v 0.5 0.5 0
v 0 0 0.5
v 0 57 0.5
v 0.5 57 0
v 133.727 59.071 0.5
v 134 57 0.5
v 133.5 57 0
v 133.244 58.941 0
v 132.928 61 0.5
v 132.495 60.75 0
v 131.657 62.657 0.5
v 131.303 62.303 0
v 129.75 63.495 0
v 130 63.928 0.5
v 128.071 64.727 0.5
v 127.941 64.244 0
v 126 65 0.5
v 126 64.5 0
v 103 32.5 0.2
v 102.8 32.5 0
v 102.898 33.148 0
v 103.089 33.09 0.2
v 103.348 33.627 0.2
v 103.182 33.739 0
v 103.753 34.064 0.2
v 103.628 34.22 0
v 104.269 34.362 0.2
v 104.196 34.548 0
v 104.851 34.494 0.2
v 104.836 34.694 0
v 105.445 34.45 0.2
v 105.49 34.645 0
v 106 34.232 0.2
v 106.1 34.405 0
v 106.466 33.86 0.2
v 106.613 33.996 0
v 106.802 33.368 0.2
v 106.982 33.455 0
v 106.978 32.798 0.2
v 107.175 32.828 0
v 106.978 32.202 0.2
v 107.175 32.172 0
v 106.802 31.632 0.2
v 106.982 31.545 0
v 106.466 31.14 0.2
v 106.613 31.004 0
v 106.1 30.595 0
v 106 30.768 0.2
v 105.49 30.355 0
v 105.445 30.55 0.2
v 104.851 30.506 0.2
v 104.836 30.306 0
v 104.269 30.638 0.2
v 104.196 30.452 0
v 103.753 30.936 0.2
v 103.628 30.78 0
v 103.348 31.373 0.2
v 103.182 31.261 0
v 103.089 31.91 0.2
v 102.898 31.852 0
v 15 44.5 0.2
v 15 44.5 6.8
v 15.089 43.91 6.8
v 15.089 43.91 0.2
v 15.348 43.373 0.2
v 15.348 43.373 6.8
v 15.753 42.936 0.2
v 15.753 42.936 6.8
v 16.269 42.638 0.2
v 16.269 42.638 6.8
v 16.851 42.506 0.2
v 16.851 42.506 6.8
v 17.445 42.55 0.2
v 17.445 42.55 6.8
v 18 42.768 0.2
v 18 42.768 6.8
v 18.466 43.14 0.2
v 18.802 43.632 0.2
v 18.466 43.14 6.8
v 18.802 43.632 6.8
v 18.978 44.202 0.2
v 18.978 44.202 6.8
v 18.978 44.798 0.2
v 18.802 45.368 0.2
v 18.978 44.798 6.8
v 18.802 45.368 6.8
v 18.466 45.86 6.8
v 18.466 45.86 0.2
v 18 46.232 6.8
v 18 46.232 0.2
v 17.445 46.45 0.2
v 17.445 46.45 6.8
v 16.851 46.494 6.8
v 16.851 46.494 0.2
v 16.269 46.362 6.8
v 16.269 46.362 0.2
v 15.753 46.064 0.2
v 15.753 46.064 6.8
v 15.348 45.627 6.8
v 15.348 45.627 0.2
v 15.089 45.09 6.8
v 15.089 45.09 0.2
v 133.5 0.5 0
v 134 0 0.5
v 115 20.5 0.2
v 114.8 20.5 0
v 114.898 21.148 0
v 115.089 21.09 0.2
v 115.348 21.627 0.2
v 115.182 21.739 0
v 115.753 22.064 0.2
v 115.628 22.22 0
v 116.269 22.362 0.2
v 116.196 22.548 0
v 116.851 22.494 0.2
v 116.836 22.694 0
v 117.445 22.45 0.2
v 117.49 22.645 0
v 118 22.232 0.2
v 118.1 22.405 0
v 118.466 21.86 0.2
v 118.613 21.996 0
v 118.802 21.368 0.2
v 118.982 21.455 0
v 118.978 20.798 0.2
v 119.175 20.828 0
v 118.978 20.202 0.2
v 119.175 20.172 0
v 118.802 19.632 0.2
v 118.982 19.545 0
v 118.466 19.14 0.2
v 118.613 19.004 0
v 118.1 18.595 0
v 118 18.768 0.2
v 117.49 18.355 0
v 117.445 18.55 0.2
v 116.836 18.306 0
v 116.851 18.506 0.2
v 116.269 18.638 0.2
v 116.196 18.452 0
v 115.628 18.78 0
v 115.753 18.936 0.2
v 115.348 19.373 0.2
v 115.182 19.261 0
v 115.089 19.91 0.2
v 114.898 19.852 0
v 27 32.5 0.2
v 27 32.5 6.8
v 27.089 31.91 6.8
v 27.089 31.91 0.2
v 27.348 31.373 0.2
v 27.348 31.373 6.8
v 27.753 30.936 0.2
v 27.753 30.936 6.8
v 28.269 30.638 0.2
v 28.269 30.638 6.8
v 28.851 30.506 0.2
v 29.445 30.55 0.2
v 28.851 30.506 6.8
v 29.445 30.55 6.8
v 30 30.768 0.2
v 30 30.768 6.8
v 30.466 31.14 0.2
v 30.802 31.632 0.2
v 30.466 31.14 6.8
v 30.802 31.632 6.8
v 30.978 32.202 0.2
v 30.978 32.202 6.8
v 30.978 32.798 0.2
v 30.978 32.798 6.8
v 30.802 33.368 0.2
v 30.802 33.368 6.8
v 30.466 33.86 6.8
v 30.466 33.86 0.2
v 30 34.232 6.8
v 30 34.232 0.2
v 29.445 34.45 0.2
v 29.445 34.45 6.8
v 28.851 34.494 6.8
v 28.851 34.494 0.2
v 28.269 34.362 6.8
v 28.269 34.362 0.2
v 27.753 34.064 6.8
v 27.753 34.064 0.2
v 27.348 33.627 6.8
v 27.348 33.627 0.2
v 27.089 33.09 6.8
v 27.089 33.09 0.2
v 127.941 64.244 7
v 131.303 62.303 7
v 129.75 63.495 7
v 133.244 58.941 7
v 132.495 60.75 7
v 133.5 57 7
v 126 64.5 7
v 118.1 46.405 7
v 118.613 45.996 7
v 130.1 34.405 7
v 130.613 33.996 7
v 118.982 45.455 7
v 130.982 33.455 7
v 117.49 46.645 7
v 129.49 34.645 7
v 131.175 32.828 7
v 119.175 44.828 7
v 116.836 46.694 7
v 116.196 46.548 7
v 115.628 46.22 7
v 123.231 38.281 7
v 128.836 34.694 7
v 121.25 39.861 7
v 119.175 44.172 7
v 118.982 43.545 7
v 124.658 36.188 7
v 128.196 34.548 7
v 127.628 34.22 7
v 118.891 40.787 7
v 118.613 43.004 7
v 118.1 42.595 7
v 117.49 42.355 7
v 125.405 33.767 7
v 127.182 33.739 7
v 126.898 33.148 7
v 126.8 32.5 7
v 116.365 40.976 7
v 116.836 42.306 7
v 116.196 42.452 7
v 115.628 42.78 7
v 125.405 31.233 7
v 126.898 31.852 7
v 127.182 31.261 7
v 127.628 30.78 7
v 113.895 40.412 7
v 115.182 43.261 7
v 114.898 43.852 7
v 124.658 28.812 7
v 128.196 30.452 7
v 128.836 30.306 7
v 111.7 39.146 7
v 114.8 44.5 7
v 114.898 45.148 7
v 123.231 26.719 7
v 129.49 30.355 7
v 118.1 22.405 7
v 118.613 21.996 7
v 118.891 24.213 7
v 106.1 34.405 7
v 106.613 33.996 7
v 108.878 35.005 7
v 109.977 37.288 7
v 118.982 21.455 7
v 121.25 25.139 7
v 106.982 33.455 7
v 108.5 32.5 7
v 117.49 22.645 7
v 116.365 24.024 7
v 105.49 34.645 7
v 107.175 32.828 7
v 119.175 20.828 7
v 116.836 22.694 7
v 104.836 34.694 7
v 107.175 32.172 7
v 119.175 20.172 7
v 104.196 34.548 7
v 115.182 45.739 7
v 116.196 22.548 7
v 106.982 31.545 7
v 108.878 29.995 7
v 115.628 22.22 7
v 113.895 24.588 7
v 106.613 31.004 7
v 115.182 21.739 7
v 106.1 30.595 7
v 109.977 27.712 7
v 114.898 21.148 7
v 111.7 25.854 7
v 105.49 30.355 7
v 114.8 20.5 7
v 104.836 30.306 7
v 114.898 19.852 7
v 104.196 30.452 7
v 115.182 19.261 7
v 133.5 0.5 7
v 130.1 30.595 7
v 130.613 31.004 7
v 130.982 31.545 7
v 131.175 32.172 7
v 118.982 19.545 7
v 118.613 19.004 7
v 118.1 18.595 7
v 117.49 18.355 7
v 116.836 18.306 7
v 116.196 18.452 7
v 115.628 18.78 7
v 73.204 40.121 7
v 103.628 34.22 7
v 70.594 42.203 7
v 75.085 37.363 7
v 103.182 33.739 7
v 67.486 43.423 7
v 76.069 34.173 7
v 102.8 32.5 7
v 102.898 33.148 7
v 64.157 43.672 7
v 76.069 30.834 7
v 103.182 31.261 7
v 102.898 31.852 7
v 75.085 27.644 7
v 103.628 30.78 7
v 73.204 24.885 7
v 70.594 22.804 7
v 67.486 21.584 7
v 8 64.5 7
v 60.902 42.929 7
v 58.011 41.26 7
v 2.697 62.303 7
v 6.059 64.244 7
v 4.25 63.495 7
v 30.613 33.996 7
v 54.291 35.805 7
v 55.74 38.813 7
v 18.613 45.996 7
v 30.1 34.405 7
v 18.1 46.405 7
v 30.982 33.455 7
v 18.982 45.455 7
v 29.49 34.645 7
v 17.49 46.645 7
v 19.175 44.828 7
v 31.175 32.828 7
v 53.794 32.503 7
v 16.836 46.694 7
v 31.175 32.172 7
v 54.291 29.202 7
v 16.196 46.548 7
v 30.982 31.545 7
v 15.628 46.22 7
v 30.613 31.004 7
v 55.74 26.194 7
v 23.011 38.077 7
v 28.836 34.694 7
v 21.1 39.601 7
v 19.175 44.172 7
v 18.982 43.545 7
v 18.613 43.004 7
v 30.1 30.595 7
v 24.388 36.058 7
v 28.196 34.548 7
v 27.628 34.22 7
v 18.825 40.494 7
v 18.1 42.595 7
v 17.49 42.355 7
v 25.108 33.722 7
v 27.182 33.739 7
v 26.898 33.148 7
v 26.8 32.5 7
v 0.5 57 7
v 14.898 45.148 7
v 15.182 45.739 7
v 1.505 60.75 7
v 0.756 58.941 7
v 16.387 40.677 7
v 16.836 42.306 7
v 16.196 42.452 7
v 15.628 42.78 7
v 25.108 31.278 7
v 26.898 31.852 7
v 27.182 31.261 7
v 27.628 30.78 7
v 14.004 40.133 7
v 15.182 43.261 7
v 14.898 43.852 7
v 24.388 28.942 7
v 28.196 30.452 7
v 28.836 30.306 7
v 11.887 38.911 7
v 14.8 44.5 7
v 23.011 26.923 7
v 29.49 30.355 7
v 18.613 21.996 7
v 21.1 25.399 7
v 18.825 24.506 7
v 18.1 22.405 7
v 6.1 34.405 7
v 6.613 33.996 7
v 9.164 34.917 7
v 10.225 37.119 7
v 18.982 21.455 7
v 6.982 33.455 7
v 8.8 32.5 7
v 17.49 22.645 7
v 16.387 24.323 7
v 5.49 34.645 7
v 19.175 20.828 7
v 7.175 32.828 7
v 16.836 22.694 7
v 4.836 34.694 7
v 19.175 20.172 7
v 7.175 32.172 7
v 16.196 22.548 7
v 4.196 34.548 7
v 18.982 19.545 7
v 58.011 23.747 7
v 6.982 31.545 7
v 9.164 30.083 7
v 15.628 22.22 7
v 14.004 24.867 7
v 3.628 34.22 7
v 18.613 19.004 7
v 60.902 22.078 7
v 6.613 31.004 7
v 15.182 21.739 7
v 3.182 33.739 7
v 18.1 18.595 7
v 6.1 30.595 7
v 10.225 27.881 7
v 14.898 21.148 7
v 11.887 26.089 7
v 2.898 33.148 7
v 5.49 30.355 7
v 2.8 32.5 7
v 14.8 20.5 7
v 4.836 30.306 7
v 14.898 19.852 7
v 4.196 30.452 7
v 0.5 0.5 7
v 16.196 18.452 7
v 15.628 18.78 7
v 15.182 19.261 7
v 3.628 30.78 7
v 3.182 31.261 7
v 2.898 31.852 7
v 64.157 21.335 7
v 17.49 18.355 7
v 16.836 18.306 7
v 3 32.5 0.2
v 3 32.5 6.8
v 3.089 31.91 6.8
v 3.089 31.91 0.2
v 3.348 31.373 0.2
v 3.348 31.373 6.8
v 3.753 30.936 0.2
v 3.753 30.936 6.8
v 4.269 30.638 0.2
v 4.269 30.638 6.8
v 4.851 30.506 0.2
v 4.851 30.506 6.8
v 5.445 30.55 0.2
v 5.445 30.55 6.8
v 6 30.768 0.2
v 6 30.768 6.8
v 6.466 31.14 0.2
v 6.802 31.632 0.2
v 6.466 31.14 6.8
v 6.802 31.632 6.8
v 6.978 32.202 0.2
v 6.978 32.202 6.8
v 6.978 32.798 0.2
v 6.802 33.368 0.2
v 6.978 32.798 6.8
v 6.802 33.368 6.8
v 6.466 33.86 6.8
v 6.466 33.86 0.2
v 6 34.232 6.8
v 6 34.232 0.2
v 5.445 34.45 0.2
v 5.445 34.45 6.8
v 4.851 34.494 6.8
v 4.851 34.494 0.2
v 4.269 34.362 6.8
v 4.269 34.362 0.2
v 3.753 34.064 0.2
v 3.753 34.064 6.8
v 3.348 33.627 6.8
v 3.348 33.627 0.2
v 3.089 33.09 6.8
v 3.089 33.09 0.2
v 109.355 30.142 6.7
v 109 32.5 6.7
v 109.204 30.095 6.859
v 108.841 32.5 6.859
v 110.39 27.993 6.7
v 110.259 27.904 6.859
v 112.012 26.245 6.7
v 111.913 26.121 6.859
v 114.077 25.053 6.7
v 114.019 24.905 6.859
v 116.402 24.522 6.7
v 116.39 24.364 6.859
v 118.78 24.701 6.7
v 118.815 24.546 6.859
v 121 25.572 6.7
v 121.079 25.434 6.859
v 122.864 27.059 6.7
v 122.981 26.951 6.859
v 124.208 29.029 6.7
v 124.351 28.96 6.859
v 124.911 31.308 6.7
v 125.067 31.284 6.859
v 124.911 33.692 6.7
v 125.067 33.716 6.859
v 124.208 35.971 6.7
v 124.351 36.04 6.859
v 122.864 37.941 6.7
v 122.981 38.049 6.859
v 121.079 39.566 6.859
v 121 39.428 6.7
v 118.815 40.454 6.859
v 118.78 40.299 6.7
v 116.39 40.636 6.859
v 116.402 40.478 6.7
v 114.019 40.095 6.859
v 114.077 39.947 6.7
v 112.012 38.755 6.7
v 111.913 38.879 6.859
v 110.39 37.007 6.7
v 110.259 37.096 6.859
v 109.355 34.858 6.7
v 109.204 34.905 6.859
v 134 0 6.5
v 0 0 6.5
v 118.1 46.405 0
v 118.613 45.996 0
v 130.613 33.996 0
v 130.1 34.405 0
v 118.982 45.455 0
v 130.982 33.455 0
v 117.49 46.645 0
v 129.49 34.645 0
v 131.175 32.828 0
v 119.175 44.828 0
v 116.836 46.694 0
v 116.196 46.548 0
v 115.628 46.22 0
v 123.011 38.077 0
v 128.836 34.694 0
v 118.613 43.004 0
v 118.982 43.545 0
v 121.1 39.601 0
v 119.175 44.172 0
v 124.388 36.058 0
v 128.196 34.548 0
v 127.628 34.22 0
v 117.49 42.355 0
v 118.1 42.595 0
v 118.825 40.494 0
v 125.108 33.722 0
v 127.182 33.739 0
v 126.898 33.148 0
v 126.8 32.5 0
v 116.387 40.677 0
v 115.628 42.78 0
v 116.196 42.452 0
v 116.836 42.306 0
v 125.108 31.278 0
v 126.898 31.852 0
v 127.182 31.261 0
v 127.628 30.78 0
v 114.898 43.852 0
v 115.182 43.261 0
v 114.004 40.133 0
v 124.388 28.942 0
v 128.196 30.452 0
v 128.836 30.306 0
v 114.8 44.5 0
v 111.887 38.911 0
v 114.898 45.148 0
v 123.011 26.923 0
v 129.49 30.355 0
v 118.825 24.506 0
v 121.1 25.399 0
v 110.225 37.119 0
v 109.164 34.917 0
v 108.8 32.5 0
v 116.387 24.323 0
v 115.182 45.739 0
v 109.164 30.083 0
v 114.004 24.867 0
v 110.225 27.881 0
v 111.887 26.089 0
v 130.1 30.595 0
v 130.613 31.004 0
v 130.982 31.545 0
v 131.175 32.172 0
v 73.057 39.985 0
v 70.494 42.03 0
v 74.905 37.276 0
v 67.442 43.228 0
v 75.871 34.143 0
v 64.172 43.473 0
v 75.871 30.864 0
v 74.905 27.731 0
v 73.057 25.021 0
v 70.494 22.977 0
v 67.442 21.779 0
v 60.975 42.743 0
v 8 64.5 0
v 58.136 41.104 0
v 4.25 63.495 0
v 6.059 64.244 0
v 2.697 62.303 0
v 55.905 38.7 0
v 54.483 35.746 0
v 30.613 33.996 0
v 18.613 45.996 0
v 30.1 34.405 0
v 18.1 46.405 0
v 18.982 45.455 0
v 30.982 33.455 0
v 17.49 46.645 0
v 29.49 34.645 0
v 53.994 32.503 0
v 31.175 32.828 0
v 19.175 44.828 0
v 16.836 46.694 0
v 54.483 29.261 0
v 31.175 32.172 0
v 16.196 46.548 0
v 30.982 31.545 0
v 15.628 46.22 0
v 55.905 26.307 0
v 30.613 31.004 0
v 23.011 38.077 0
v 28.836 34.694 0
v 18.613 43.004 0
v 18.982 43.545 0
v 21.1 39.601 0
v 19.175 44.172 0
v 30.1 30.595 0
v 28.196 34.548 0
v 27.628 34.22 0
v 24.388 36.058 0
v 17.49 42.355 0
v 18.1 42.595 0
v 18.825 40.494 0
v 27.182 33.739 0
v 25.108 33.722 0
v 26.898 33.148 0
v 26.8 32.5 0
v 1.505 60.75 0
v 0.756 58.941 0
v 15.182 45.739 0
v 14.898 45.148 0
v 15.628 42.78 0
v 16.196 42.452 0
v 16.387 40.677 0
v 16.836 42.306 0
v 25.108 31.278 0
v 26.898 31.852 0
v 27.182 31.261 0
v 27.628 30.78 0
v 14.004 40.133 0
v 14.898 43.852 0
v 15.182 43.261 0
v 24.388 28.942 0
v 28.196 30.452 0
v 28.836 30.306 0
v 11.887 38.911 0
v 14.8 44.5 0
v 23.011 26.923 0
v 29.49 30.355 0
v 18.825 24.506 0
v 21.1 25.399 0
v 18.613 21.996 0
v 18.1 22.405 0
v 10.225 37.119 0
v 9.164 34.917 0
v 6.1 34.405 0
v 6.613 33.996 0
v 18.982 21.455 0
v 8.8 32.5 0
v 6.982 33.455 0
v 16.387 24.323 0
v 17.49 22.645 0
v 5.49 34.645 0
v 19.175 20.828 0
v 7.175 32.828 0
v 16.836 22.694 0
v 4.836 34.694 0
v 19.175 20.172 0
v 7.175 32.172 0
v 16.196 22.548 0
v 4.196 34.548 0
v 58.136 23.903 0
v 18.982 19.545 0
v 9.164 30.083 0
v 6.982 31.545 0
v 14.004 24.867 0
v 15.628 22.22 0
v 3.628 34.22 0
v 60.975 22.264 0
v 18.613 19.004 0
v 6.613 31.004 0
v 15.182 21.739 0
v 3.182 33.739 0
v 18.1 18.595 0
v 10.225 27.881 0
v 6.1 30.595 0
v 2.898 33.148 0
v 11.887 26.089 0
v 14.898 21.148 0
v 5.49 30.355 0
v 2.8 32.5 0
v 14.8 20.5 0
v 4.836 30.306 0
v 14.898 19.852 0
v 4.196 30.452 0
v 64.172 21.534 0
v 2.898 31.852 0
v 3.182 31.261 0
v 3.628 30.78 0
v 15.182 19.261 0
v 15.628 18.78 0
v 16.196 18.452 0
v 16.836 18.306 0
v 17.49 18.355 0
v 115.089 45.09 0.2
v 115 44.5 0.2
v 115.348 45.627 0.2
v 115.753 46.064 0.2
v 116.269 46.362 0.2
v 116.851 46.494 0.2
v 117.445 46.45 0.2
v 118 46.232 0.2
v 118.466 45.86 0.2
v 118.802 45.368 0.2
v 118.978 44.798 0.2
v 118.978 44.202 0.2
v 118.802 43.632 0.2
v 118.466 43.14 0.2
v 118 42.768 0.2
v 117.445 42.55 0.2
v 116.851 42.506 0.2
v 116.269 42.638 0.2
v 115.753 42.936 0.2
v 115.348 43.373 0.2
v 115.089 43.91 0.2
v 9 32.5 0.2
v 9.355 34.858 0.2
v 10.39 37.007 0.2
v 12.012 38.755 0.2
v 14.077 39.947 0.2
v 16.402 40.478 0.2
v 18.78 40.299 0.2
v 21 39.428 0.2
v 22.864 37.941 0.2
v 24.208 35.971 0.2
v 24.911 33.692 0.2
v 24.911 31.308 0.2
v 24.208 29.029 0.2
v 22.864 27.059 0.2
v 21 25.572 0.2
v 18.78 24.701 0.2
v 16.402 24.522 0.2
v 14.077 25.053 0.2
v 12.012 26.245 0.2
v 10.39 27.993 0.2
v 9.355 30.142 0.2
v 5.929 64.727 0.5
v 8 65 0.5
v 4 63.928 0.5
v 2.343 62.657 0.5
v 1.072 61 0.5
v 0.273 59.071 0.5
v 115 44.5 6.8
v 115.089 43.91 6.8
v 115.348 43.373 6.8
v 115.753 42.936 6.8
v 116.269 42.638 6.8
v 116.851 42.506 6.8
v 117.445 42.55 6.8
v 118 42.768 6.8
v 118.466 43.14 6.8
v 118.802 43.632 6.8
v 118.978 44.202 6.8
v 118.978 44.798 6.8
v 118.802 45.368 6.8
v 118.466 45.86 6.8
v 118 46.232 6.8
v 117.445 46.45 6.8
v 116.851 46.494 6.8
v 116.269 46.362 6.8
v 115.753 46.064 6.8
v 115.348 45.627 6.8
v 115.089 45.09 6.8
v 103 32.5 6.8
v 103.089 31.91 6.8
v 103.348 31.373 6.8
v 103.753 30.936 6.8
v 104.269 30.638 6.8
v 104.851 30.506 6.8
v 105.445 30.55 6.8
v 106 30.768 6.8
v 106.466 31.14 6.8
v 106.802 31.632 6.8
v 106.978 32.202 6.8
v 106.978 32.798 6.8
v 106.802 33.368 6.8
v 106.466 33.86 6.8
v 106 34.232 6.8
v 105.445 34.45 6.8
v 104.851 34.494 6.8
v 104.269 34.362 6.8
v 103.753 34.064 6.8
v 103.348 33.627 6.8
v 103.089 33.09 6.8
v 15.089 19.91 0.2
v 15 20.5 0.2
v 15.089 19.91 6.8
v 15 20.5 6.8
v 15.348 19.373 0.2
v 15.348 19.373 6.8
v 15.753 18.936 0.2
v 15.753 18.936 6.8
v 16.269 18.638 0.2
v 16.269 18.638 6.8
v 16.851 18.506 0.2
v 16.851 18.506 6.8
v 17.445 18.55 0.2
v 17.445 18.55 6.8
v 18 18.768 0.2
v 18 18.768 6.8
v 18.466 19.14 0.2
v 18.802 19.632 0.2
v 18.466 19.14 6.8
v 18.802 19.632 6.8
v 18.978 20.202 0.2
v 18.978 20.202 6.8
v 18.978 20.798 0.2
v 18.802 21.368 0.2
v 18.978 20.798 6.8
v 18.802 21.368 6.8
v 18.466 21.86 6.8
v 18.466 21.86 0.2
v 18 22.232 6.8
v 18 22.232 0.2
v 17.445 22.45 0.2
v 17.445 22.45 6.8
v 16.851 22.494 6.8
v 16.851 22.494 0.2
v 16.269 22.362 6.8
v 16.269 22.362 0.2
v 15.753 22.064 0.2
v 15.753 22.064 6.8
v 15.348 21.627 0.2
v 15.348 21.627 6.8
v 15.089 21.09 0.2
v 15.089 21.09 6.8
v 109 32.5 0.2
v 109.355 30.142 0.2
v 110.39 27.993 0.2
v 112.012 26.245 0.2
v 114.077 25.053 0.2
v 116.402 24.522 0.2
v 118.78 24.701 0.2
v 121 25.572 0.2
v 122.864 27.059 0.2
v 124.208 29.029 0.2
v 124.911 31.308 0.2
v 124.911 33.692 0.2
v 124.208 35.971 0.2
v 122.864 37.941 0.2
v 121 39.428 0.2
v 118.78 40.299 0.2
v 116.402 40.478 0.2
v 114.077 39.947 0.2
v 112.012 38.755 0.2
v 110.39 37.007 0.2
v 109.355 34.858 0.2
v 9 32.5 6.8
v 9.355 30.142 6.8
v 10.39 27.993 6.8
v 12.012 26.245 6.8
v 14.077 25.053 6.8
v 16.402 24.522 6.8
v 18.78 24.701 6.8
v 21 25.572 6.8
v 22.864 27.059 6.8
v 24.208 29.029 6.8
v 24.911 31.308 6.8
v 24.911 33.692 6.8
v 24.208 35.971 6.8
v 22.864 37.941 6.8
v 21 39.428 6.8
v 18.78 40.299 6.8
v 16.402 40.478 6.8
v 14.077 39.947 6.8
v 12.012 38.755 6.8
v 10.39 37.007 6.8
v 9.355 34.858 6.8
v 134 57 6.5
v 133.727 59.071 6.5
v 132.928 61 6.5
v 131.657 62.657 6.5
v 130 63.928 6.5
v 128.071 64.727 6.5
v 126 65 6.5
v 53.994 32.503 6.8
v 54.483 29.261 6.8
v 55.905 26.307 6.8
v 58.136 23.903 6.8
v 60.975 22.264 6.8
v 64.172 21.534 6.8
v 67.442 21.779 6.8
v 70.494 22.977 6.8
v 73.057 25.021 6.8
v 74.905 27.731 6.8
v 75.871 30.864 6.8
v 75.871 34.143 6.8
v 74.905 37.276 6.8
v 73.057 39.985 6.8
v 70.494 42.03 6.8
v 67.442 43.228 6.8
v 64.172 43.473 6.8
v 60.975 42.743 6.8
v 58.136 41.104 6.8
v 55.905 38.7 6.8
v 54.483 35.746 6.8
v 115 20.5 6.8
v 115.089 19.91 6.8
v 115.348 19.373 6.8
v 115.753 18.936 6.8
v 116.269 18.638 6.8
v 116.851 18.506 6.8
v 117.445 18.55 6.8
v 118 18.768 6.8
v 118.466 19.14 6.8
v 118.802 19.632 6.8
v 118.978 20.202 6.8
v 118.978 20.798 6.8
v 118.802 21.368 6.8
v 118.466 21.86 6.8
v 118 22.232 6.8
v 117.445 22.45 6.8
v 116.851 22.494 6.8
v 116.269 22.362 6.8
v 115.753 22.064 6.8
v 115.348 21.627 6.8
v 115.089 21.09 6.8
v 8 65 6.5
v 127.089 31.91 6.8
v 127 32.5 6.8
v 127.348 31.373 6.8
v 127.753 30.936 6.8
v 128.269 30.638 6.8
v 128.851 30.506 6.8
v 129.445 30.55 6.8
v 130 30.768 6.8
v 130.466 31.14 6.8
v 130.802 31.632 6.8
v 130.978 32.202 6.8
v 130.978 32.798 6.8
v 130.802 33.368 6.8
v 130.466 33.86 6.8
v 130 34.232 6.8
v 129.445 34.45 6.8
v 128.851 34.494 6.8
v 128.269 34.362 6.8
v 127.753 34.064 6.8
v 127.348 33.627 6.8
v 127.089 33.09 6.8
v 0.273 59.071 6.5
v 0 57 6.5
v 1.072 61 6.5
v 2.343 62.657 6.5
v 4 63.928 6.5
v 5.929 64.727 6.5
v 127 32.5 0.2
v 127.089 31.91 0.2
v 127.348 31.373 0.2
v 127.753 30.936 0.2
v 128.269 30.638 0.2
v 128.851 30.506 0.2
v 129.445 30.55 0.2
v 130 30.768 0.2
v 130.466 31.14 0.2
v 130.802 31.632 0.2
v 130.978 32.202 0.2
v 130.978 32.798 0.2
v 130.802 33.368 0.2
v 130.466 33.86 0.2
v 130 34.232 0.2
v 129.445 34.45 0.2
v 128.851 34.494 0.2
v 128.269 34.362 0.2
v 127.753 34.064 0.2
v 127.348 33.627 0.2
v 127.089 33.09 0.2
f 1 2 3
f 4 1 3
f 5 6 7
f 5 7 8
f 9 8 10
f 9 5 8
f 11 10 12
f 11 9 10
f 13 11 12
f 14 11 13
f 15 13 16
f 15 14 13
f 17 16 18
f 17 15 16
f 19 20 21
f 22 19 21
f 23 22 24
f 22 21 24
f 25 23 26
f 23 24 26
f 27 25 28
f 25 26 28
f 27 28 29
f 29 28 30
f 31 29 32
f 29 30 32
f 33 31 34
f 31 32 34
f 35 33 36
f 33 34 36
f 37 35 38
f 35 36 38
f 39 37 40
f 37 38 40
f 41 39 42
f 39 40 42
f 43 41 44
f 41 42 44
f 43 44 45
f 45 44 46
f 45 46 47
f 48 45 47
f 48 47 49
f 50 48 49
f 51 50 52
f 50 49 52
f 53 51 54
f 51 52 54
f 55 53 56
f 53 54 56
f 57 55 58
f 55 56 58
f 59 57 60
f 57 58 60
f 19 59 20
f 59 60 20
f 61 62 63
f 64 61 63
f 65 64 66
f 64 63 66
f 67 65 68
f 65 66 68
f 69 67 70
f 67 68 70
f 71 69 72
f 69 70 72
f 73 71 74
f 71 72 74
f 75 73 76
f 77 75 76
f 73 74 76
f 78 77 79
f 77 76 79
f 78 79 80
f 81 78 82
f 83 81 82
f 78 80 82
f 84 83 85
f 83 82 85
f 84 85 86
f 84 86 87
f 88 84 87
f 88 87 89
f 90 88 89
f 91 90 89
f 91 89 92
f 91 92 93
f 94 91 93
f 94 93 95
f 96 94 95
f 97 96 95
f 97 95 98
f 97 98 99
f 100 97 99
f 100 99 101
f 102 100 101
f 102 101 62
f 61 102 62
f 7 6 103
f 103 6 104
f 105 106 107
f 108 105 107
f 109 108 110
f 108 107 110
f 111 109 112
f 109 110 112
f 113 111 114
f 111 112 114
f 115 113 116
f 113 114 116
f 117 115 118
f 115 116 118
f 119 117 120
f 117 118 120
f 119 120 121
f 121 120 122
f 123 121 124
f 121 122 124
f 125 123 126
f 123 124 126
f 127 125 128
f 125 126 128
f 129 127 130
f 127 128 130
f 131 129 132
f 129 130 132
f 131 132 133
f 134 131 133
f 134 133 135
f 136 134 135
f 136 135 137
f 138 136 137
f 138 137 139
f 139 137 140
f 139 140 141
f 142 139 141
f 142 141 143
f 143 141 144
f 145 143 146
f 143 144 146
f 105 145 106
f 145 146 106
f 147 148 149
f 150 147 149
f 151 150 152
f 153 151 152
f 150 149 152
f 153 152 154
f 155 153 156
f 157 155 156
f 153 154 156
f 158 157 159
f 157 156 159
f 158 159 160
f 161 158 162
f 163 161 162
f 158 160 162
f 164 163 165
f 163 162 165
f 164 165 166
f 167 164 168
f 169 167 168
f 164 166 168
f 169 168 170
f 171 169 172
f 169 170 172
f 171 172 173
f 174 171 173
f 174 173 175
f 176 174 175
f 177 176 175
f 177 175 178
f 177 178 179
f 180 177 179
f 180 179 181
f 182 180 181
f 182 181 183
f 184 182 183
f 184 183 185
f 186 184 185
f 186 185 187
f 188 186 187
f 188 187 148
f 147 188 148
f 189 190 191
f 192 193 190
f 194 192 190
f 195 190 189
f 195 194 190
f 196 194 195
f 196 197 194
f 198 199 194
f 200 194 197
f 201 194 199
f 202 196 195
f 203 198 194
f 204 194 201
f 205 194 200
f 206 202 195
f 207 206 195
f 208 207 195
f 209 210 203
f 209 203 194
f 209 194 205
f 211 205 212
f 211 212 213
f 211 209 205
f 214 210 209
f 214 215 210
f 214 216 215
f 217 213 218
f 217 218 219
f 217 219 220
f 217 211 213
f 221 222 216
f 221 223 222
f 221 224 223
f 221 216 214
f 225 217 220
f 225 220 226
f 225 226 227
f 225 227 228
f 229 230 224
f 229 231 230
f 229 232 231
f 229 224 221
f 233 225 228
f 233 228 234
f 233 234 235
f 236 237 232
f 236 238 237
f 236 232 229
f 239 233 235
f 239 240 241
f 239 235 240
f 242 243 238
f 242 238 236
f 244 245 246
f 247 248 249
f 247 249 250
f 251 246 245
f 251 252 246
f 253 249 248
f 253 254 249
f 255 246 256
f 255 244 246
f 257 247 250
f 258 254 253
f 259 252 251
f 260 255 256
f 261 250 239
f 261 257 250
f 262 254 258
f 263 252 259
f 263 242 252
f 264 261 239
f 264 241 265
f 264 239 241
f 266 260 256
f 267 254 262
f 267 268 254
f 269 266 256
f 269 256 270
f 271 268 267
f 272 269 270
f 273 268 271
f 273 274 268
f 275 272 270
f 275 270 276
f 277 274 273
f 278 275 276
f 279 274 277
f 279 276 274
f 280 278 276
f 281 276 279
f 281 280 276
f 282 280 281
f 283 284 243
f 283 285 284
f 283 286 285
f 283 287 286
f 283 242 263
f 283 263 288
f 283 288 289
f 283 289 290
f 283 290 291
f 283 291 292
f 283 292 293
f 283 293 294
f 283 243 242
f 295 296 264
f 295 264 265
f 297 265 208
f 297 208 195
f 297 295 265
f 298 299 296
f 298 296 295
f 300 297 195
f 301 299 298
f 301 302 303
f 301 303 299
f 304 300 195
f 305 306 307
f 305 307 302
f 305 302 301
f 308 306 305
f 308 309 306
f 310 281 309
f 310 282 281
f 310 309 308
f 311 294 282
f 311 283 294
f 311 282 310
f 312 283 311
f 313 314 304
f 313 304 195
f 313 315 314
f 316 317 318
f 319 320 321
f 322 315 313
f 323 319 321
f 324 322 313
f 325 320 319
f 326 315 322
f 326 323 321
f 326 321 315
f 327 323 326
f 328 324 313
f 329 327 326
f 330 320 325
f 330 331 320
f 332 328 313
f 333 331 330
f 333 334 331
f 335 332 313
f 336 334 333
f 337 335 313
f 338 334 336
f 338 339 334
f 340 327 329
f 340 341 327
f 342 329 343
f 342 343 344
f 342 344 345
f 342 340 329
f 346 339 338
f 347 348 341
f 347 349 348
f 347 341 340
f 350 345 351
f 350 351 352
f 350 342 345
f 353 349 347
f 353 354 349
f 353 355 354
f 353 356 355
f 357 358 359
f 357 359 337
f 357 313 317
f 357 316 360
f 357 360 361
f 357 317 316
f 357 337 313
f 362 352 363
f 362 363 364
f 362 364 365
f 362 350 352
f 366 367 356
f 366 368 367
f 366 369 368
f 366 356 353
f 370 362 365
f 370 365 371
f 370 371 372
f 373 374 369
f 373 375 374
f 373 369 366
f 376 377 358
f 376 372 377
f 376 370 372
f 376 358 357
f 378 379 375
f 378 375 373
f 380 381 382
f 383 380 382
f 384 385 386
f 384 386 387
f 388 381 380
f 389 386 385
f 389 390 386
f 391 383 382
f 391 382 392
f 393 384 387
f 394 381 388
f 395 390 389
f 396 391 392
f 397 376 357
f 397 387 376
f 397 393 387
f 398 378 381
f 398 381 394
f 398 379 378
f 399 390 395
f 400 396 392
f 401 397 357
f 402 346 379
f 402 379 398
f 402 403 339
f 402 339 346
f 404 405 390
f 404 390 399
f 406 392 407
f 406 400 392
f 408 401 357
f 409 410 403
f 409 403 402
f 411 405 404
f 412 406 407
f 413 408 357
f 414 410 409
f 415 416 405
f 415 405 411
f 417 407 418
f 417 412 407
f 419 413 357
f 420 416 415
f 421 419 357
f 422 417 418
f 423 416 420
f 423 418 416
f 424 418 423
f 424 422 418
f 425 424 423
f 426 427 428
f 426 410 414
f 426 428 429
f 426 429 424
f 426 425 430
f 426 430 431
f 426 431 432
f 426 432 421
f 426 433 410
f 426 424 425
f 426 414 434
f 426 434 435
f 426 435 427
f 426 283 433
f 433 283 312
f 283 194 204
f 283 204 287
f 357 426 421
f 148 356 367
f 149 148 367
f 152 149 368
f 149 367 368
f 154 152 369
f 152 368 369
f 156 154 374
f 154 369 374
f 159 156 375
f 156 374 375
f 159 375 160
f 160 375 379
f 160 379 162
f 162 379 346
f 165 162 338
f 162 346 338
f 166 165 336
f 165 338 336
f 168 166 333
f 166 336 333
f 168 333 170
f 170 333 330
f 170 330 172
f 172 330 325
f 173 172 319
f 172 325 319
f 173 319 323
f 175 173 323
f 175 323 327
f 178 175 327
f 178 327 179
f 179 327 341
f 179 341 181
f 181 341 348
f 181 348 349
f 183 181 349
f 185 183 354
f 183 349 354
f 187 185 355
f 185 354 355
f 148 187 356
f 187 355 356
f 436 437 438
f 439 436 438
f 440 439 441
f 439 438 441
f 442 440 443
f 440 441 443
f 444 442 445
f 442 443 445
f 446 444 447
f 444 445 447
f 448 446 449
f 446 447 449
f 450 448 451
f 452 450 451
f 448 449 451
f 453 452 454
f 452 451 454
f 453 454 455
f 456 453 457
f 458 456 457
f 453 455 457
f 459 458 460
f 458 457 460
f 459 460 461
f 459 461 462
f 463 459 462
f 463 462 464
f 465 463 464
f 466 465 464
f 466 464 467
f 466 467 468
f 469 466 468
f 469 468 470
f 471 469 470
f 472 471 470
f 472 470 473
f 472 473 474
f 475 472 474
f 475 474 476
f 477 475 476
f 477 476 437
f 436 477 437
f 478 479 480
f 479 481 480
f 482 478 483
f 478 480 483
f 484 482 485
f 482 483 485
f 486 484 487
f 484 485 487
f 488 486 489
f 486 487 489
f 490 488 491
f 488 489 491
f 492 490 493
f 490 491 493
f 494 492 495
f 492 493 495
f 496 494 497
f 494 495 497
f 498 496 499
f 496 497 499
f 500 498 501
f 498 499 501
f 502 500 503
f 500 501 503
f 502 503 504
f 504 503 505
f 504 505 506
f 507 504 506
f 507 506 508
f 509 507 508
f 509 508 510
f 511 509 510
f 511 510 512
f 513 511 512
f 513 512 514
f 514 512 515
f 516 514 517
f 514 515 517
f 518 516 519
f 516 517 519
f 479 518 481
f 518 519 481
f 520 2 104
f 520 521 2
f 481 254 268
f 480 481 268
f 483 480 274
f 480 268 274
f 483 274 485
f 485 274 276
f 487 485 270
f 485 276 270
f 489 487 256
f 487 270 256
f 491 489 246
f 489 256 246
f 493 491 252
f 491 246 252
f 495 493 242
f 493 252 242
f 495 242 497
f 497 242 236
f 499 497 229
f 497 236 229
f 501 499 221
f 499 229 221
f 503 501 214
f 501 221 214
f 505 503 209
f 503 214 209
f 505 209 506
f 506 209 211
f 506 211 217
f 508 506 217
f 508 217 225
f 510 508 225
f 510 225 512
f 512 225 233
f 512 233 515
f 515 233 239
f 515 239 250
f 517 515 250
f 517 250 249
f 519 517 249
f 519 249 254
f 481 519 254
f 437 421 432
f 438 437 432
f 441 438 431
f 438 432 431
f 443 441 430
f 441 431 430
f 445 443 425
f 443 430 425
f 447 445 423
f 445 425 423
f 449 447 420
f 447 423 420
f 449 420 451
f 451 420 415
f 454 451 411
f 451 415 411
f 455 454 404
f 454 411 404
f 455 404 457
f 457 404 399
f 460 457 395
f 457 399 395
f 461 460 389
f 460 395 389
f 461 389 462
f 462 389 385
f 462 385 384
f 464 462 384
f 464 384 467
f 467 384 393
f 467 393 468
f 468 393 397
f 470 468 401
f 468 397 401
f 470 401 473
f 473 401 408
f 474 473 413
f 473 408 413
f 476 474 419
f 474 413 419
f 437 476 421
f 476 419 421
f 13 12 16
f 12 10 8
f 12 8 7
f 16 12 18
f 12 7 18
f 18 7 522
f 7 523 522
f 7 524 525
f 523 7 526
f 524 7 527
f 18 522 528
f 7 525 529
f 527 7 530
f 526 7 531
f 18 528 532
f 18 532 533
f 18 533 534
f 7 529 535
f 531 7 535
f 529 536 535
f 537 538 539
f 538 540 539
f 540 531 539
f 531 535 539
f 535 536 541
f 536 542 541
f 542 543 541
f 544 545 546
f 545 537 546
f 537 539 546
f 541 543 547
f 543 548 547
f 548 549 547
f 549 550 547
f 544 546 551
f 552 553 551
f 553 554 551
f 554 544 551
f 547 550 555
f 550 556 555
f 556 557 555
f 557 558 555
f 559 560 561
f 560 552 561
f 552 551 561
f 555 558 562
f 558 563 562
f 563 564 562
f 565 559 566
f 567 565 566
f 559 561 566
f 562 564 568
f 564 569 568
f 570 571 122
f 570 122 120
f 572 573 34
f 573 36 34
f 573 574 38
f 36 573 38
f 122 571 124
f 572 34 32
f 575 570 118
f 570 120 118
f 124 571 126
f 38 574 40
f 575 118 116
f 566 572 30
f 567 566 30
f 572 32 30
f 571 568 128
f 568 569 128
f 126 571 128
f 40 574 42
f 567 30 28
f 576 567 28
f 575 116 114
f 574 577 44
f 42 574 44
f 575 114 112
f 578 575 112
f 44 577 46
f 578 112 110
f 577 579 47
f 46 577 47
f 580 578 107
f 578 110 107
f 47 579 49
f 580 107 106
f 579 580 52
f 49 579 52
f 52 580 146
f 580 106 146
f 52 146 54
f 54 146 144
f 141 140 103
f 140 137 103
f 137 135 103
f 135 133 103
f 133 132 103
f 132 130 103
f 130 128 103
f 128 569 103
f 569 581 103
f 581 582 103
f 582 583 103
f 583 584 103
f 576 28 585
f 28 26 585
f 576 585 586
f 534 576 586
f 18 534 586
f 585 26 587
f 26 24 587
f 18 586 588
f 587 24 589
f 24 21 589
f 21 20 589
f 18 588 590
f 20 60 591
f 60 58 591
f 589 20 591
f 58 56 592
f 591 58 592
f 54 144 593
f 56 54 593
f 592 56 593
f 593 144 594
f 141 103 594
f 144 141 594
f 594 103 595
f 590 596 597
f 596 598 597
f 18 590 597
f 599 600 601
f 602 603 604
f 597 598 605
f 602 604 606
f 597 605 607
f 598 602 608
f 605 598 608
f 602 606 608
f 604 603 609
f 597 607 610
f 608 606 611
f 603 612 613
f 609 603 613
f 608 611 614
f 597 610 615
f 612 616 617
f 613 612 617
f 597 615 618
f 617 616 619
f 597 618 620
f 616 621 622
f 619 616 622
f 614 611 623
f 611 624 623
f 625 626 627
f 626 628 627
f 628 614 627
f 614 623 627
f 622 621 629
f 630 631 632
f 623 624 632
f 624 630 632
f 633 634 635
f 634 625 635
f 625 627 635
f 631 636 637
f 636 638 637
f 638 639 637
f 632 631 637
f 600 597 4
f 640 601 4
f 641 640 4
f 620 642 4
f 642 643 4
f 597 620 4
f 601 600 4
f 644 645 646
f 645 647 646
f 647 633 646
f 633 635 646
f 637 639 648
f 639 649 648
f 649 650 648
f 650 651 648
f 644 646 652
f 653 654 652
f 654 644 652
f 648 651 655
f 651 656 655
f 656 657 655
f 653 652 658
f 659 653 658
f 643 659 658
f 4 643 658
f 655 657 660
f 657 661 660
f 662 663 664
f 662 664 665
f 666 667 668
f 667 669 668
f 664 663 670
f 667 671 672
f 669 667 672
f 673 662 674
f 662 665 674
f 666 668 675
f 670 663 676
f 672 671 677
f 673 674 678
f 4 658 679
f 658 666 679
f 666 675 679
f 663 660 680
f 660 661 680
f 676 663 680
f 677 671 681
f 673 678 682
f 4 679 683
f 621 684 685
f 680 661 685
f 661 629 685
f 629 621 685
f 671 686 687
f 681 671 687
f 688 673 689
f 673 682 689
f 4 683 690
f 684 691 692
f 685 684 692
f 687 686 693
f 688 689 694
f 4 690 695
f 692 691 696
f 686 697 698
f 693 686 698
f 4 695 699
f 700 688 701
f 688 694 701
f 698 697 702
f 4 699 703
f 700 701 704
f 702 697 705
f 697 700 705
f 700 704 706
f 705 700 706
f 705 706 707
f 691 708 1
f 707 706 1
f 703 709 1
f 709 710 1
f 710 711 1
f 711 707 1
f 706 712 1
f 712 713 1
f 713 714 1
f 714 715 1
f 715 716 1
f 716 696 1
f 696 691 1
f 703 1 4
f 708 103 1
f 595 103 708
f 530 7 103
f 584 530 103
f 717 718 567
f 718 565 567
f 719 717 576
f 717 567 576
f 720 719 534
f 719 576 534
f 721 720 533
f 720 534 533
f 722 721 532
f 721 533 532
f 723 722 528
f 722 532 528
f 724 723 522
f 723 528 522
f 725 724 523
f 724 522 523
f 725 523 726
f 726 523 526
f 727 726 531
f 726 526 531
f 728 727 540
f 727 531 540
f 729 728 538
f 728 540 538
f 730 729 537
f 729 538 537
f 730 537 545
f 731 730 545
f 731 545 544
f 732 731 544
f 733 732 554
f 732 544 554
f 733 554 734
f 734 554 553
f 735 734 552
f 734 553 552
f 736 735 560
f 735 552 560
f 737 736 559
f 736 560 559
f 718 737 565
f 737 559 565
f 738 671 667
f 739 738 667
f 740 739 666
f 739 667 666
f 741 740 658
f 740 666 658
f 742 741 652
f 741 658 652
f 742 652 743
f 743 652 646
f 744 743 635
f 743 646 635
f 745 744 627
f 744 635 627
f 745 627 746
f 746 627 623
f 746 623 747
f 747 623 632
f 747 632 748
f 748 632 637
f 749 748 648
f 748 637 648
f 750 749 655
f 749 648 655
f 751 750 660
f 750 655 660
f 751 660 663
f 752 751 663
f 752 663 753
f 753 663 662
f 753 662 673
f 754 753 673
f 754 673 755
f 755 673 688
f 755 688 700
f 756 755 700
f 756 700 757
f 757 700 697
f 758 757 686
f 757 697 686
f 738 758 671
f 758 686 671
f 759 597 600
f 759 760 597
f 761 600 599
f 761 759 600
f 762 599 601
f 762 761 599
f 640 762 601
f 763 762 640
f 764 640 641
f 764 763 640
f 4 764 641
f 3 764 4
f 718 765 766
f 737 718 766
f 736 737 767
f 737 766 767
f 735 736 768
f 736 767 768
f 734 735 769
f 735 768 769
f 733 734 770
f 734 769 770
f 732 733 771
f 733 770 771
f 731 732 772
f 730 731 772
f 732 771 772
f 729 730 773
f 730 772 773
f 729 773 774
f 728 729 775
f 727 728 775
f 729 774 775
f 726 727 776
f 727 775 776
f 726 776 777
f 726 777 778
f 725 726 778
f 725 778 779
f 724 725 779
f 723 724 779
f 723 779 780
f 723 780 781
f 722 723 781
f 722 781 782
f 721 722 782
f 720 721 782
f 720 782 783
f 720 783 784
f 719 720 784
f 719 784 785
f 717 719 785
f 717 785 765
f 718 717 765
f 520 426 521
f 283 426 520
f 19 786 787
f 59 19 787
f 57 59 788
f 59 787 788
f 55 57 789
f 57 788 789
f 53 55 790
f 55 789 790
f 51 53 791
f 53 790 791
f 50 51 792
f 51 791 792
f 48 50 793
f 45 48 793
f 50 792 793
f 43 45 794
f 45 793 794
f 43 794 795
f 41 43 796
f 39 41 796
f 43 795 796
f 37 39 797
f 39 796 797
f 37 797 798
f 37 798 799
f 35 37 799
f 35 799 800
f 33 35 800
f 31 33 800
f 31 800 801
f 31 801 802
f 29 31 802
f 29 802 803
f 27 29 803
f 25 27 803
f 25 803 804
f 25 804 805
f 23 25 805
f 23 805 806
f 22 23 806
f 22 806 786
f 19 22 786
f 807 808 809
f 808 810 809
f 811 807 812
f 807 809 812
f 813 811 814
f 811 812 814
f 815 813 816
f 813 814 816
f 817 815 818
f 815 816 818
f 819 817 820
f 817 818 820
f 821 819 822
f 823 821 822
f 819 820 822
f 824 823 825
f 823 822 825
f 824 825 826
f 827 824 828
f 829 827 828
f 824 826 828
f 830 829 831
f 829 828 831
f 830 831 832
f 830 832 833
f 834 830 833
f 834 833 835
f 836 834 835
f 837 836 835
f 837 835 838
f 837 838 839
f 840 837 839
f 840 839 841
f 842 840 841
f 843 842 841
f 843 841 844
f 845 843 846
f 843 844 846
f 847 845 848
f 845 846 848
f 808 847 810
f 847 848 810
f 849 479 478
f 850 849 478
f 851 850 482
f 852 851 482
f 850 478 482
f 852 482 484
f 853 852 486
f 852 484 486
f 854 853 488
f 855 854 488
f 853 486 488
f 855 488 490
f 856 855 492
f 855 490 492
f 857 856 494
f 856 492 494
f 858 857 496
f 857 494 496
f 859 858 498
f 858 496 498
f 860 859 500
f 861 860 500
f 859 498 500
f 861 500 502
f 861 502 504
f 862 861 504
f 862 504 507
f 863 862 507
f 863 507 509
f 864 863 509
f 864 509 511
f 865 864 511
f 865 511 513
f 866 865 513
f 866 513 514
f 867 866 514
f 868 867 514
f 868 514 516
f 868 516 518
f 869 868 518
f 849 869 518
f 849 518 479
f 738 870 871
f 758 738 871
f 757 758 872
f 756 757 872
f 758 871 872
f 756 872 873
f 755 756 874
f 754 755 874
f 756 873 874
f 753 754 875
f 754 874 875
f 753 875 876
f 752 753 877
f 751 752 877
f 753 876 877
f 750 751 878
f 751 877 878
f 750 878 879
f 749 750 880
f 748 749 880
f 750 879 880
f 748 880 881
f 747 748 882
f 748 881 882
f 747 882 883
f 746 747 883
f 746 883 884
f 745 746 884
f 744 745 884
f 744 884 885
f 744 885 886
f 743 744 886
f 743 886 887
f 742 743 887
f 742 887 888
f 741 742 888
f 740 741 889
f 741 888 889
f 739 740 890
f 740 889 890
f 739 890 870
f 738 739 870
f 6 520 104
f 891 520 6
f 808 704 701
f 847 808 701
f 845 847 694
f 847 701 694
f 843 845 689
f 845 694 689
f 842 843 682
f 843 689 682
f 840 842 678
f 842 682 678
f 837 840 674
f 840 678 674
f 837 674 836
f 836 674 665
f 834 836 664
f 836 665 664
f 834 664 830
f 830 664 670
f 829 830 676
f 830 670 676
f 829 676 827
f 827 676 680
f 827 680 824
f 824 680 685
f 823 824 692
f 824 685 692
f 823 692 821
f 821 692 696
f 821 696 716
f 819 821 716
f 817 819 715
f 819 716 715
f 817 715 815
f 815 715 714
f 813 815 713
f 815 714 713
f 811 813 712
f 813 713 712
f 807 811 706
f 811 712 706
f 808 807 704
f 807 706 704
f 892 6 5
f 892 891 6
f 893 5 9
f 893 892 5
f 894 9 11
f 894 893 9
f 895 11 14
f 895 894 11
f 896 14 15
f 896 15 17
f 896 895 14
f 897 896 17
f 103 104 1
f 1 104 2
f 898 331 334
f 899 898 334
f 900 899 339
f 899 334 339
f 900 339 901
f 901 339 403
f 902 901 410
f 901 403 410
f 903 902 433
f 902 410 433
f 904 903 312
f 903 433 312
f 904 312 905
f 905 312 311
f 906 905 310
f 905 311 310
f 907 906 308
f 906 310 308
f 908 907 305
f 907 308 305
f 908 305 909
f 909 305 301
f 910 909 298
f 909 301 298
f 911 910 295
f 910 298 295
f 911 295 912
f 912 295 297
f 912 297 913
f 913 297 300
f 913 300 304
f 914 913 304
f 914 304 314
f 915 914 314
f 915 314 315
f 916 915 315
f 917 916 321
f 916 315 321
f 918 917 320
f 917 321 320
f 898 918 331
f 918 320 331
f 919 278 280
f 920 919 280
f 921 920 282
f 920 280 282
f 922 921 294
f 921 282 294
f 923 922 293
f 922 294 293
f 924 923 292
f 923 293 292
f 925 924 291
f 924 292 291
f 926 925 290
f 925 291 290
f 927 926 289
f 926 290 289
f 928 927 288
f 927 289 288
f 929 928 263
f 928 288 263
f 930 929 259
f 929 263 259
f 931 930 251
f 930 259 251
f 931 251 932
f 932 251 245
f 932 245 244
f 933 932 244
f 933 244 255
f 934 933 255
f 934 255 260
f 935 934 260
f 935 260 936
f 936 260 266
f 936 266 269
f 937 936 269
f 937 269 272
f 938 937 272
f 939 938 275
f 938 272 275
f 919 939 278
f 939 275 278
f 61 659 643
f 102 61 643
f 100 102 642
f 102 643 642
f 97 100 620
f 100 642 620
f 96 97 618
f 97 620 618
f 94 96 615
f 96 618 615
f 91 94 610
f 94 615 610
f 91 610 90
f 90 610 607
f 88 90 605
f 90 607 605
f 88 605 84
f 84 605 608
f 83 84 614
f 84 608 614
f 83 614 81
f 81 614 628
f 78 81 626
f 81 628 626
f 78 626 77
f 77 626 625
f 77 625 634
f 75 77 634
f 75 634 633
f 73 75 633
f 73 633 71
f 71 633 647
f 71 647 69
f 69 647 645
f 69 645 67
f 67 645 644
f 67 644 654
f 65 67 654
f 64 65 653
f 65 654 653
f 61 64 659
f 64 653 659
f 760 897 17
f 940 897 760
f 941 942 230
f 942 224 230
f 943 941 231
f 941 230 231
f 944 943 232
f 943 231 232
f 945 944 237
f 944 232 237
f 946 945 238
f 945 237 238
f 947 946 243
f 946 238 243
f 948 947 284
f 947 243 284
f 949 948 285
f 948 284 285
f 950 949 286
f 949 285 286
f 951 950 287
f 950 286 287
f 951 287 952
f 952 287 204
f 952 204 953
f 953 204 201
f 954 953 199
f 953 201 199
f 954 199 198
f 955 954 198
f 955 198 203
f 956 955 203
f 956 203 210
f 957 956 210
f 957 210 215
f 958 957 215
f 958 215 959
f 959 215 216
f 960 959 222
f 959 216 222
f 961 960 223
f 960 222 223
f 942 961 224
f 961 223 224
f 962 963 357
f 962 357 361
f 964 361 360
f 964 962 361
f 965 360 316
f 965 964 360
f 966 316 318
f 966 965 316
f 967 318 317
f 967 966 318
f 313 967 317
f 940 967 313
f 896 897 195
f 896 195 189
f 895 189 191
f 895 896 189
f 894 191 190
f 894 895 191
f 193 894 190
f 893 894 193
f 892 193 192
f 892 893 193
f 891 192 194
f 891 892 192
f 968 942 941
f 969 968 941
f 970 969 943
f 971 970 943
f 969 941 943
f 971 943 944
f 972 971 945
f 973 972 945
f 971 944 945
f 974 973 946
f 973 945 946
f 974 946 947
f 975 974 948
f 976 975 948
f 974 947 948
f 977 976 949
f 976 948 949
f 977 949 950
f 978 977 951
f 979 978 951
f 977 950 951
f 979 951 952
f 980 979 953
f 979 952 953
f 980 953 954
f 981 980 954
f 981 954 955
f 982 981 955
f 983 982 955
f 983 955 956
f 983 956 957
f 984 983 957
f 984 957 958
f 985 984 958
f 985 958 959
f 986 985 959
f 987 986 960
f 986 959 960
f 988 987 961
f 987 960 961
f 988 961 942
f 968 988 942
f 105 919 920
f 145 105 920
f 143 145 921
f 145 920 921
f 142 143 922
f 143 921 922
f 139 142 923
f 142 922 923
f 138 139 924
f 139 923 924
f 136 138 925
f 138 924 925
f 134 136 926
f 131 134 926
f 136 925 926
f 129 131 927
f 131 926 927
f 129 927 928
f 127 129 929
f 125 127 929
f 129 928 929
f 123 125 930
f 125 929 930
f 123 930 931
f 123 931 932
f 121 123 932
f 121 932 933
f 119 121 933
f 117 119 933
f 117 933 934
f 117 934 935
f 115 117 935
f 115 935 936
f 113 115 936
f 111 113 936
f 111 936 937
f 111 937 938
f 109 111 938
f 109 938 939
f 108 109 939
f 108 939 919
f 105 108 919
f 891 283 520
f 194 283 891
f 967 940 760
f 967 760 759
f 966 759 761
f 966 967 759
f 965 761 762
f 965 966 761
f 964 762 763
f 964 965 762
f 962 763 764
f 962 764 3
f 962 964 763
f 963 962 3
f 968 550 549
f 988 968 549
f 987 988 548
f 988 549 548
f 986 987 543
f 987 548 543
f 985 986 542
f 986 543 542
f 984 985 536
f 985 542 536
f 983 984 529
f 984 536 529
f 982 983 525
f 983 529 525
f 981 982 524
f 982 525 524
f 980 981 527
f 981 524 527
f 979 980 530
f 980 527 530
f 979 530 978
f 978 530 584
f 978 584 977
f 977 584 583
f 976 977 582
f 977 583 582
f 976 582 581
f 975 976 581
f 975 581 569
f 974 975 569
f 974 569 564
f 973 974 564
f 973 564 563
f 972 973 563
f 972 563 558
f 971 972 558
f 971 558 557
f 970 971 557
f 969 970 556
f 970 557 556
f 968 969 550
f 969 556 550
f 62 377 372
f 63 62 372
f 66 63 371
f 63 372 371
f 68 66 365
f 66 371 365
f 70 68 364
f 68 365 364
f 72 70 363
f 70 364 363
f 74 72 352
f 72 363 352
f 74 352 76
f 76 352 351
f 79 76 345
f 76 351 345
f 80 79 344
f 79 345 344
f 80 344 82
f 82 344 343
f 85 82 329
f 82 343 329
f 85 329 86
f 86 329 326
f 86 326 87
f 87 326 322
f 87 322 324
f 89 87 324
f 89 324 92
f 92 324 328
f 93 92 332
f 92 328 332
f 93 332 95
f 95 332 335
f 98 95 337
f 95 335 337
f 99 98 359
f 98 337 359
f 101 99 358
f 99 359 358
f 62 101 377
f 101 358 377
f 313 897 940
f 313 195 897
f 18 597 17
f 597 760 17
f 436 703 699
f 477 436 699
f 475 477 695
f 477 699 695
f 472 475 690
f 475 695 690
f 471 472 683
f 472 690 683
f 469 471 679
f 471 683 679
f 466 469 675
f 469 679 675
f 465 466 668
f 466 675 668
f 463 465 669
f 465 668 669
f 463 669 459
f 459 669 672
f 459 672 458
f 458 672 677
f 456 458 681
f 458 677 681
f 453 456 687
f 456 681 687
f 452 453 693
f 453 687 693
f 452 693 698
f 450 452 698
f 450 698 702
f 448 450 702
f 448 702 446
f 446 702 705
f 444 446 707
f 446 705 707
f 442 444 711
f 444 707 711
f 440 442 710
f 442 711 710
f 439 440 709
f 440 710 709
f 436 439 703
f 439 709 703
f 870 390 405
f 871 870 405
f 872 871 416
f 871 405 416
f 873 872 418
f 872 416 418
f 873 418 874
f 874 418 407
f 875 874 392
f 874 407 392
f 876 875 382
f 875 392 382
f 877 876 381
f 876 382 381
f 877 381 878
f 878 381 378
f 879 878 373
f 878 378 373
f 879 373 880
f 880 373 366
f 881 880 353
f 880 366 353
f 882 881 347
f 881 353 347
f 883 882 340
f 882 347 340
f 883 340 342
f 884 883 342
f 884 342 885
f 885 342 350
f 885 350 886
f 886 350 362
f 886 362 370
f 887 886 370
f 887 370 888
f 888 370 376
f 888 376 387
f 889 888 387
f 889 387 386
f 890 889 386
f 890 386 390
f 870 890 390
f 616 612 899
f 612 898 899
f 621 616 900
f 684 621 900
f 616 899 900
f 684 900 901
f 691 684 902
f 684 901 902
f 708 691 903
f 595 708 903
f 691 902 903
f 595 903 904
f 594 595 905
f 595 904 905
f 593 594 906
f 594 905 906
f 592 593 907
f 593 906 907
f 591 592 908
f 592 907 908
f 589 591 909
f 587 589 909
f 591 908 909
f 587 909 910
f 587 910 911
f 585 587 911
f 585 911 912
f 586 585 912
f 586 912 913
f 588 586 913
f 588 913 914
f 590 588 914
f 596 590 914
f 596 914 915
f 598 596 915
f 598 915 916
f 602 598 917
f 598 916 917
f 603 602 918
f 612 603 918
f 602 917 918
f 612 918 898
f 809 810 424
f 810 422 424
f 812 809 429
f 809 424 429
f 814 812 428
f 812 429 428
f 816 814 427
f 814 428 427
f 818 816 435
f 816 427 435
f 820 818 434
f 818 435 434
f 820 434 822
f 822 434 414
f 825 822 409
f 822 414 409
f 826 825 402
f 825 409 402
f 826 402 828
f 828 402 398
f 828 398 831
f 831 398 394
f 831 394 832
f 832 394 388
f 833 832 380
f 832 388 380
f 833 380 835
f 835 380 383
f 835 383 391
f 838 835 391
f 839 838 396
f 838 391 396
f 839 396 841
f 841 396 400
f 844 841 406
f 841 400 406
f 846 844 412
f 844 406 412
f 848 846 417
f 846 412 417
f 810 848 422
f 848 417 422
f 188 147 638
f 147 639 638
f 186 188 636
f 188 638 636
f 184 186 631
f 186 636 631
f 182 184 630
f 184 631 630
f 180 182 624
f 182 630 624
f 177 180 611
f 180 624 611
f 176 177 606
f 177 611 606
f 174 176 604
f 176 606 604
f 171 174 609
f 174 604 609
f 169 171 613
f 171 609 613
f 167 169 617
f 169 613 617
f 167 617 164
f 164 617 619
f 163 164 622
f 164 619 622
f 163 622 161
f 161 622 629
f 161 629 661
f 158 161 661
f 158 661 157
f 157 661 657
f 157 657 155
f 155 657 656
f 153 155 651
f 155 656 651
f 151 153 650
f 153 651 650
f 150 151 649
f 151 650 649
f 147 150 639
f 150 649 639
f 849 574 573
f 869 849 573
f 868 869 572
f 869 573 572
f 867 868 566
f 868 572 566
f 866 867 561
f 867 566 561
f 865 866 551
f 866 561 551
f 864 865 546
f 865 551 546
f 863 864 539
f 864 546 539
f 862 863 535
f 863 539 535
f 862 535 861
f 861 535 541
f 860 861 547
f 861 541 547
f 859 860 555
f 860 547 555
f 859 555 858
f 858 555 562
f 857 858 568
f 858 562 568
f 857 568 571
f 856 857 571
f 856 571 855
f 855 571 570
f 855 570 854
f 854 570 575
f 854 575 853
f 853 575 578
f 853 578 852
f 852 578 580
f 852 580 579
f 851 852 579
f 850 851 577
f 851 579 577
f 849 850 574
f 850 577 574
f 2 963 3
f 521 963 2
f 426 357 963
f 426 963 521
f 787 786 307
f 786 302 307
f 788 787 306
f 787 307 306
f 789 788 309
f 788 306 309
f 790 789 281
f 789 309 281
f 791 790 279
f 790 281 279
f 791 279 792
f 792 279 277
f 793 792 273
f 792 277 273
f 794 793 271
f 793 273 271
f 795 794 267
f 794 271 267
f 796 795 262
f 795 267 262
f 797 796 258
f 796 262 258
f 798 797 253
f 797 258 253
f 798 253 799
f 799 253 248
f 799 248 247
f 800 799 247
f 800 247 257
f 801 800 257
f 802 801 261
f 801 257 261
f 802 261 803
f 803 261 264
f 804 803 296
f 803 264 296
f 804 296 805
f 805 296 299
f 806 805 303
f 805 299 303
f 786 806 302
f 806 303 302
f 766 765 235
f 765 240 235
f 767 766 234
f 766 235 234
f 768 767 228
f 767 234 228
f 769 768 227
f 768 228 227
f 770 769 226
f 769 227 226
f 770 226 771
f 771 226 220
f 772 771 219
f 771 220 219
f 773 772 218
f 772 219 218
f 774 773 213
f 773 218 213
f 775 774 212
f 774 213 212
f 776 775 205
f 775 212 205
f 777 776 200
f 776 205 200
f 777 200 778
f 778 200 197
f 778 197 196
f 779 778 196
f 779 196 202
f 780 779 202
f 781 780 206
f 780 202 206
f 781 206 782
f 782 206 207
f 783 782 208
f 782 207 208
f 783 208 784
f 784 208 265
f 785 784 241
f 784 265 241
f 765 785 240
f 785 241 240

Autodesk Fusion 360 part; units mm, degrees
sketch "Sketch1" plane through (0, 0, 7) normal (0, 0, 1) x (-1, 0, 0)
sketch "Sketch2" plane through (0, 0, 0) normal (0, 0, 1) x (1, 0, 0) in component "Bearing Bracket"
  point P0 (0, 65)
  dimension "d2" = 65
sketch "Sketch3" plane through (0, 0, 7) normal (0, 0, 1) x (-1, 0, 0) in component "Bearing Bracket"
  circle A0 centre (-17, -32.5) radius 4
  circle A1 centre (-64.9939, -32.5034) radius 11
  circle A2 centre (-117, -32.5) radius 4
  arc A3 (-134, -57) -> (-126, -65) centre (-126, -57) ccw
  line L0 (-126, -65) -> (-8, -65)
  arc A4 (-8, -65) -> (0, -57) centre (-8, -57) ccw
  line L1 (0, -57) -> (0, 0)
  line L2 (0, 0) -> (-134, 0)
  line L3 (-134, 0) -> (-134, -57)
  circle A5 centre (-64.9939, -32.5034) radius 10.5
  dimension "d3" = -0.5
extrude "Extrude1" add sketch "Sketch3" against normal blind 7 contours A3 L0 A4 L1 L2 L3
chamfer "Chamfer1" distance 0.2 angle 45 3 edges at (120.7293, 31.0535, 7) (75.2495, 28.5256, 7) (20.7293, 31.0535, 7)
chamfer "Chamfer2" distance 0.2 angle 45 1 edges at (20.7293, 33.9465, 0)
chamfer "Chamfer3" distance 0.2 angle 45 1 edges at (120.7293, 33.9465, 0)
chamfer "Chamfer4" distance 0.5 angle 45 6 edges at (134, 28.5, 0) (0, 28.5, 0) (2.3431, 62.6569, 0) (67, 65, 0) (131.6569, 62.6569, 0) (67, 0, 0)
chamfer "Chamfer5" distance 0.5 angle 45 6 edges at (0, 28.5, 7) (134, 28.5, 7) (131.6569, 62.6569, 7) (67, 65, 7) (2.3431, 62.6569, 7) (67, 0, 7)
sketch "Sketch2 (2)" plane through (0, 0, 7) normal (0, 0, 1) x (-1, 0, 0)
  circle A0 centre (-17, -32.5) radius 4.2
  circle A1 centre (-117, -32.5) radius 4.2
  circle A2 centre (-64.9939, -32.5034) radius 11.2
  line L0 (-133.5, -0.5) -> (-133.5, -57)
  arc A3 (-133.5, -57) -> (-126, -64.5) centre (-126, -57) ccw
  line L1 (-126, -64.5) -> (-8, -64.5)
  arc A4 (-8, -64.5) -> (-0.5, -57) centre (-8, -57) ccw
  line L2 (-0.5, -57) -> (-0.5, -0.5)
  line L3 (-0.5, -0.5) -> (-133.5, -0.5)
  circle A5 centre (-17, -32.5) radius 8
  circle A6 centre (-117, -32.5) radius 8
  line L4 (-117, -32.5) -> (-117, -44.5)
  line L5 (-117, -32.5) -> (-117, -20.5)
  line L6 (-117, -32.5) -> (-105, -32.5)
  line L7 (-117, -32.5) -> (-129, -32.5)
  circle A7 centre (-117, -44.5) radius 2
  circle A8 centre (-129, -32.5) radius 2
  circle A9 centre (-117, -20.5) radius 2
  circle A10 centre (-105, -32.5) radius 2
  line L8 (-17, -32.5) -> (-17, -44.5)
  line L9 (-17, -32.5) -> (-17, -20.5)
  line L10 (-17, -32.5) -> (-29, -32.5)
  line L11 (-17, -32.5) -> (-5, -32.5)
  circle A11 centre (-17, -44.5) radius 2
  circle A12 centre (-17, -20.5) radius 2
  circle A13 centre (-29, -32.5) radius 2
  circle A14 centre (-5, -32.5) radius 2
  dimension "d11" = 16
  dimension "d12" = 16
  dimension "d13" = 12
  dimension "d14" = 12
  dimension "d15" = 12
  dimension "d16" = 12
  dimension "d17" = 4
  dimension "d18" = 4
  dimension "d19" = 4
  dimension "d20" = 4
  dimension "d21" = 12
  dimension "d22" = 12
  dimension "d23" = 12
  dimension "d24" = 12
  dimension "d25" = 4
  dimension "d26" = 4
  dimension "d27" = 4
  dimension "d28" = 4
extrude "Extrude2" cut sketch "Sketch2 (2)" against normal blind 25 contours A0 L9 L11 | A0 A5 L8 L11 | A0 L8 L11 | A0 A5 L9 L11 | A0 L9 L10 | A0 A5 L9 L10 | A0 A5 L8 L10 | A0 L8 L10 | A11 | A13 | A12 | A14 | A1 L5 L6 | A1 A6 L4 L6 | A1 L4 L6 | A1 A6 L5 L6 | A1 L5 L7 | A1 A6 L5 L7 | A1 A6 L4 L7 | A1 L4 L7 | A7 | A8 | A9 | A10
chamfer "Chamfer6" distance 0.3 angle 45 1 edges at (124.4586, 29.6071, 7)
chamfer "Chamfer7" distance 0.2 angle 45 1 edges at (118.8647, 43.7768, 7)
chamfer "Chamfer8" distance 0.2 angle 45 1 edges at (124.7383, 35.5014, 7)
chamfer "Chamfer9" distance 0.2 angle 45 1 edges at (130.8647, 31.7768, 7)
chamfer "Chamfer10" distance 0.2 angle 45 1 edges at (118.8647, 19.7768, 7)
chamfer "Chamfer11" distance 0.2 angle 45 1 edges at (106.8647, 31.7768, 7)
chamfer "Chamfer12" distance 0.2 angle 45 5 edges at (24.4586, 29.6071, 7) (30.8647, 31.7768, 7) (18.8647, 43.7768, 7) (6.8647, 31.7768, 7) (18.8647, 19.7768, 7)
chamfer "Chamfer13" distance 0.2 angle 45 10 edges at (24.4586, 35.3929, 0) (6.8647, 33.2232, 0) (18.8647, 45.2232, 0) (30.8647, 33.2232, 0) (18.8647, 21.2232, 0) (118.8647, 21.2232, 0) (124.4586, 35.3929, 0) (106.8647, 33.2232, 0) (118.8647, 45.2232, 0) (130.8647, 33.2232, 0)
component "Bearing Bracket" placed x (1, 0, 0) y (0, 1, 0) z (0, 0, 1) at (0, 0, 0)
